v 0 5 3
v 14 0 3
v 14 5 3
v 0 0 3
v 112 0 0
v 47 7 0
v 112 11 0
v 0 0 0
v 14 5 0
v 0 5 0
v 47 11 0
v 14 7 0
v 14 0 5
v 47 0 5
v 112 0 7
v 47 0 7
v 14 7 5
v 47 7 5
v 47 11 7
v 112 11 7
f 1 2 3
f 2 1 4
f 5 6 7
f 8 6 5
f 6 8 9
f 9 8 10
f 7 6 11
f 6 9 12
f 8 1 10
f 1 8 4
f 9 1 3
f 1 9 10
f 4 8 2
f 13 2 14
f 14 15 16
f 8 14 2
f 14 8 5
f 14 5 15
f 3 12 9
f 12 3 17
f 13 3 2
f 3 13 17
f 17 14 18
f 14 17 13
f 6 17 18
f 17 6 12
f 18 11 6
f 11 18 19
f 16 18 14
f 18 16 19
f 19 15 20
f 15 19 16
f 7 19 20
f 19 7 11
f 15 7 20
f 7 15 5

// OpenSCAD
translate([1.0, 2.5, 1.5]) color([0.42636667866841493, 0.7546182662703457, 0.2896641383723638]) cube([2, 5, 3], center=true);
translate([3.0, 2.5, 1.5]) color([0.9011387199060191, 0.4178406508691356, 0.9725485107467589]) cube([2, 5, 3], center=true);
translate([5.0, 2.5, 1.5]) color([0.8454919814395919, 0.9722338049752182, 0.6074299110948179]) cube([2, 5, 3], center=true);
translate([7.0, 2.5, 1.5]) color([0.23357109614697547, 0.8647767439340015, 0.020481785066310598]) cube([2, 5, 3], center=true);
translate([9.0, 2.5, 1.5]) color([0.8852550461906246, 0.7407454042283365, 0.30244204779608386]) cube([2, 5, 3], center=true);
translate([11.0, 2.5, 1.5]) color([0.5702666361217156, 0.3326858137966755, 0.49351002171548763]) cube([2, 5, 3], center=true);
translate([13.0, 2.5, 1.5]) color([0.2620075340788589, 0.8250203378707534, 0.7724801555877414]) cube([2, 5, 3], center=true);
translate([15.5, 3.5, 2.5]) color([0.3841597274693662, 0.3836794276703801, 0.16379542381305134]) cube([3, 7, 5], center=true);
translate([18.5, 3.5, 2.5]) color([0.9355243379423083, 0.23895170008456956, 0.7294506641472926]) cube([3, 7, 5], center=true);
translate([21.5, 3.5, 2.5]) color([0.334024645801835, 0.9418620991403894, 0.4813304127593788]) cube([3, 7, 5], center=true);
translate([24.5, 3.5, 2.5]) color([0.14090487727396894, 0.8899614875266342, 0.6019667067914363]) cube([3, 7, 5], center=true);
translate([27.5, 3.5, 2.5]) color([0.08161964024263468, 0.6986964058233333, 0.8102884962164306]) cube([3, 7, 5], center=true);
translate([30.5, 3.5, 2.5]) color([0.3527718366022422, 0.03517979094215373, 0.4662789582213983]) cube([3, 7, 5], center=true);
translate([33.5, 3.5, 2.5]) color([0.458882332198567, 0.10148050986892876, 0.7781483542276006]) cube([3, 7, 5], center=true);
translate([36.5, 3.5, 2.5]) color([0.02022807324279441, 0.5983002604350479, 0.13270195297871745]) cube([3, 7, 5], center=true);
translate([39.5, 3.5, 2.5]) color([0.3239113547302247, 0.7000796910311562, 0.6489922579129634]) cube([3, 7, 5], center=true);
translate([42.5, 3.5, 2.5]) color([0.19497362064878687, 0.7834169698984913, 0.7774609885388588]) cube([3, 7, 5], center=true);
translate([45.5, 3.5, 2.5]) color([0.11099692345616674, 0.060160827712116616, 0.7008174245595068]) cube([3, 7, 5], center=true);
translate([49.5, 5.5, 3.5]) color([0.6143308403515266, 0.9339155207415325, 0.6504721799814983]) cube([5, 11, 7], center=true);
translate([54.5, 5.5, 3.5]) color([0.9694854220936419, 0.7136168898793864, 0.2963863893491513]) cube([5, 11, 7], center=true);
translate([59.5, 5.5, 3.5]) color([0.8491315553121948, 0.95846907728749, 0.38764569013819994]) cube([5, 11, 7], center=true);
translate([64.5, 5.5, 3.5]) color([0.29380353478258403, 0.7457841029207014, 0.9575468650535228]) cube([5, 11, 7], center=true);
translate([69.5, 5.5, 3.5]) color([0.98339807845839, 0.12155240415787172, 0.8604321836344089]) cube([5, 11, 7], center=true);
translate([74.5, 5.5, 3.5]) color([0.9958411320233901, 0.03818441020037311, 0.39202639046743215]) cube([5, 11, 7], center=true);
translate([79.5, 5.5, 3.5]) color([0.3715816420064585, 0.19047756087385292, 0.3565538137373233]) cube([5, 11, 7], center=true);
translate([84.5, 5.5, 3.5]) color([0.6320134108911423, 0.9564975354421206, 0.901927522825372]) cube([5, 11, 7], center=true);
translate([89.5, 5.5, 3.5]) color([0.039980675922074105, 0.2553863294502452, 0.02665600139486224]) cube([5, 11, 7], center=true);
translate([94.5, 5.5, 3.5]) color([0.5200631817170318, 0.5692567569896342, 0.8758772851227178]) cube([5, 11, 7], center=true);
translate([99.5, 5.5, 3.5]) color([0.2296552367022351, 0.7763426439418957, 0.8846860519705121]) cube([5, 11, 7], center=true);
translate([104.5, 5.5, 3.5]) color([0.6274277551427163, 0.5024128608294012, 0.5237115354844265]) cube([5, 11, 7], center=true);
translate([109.5, 5.5, 3.5]) color([0.5071067236759631, 0.9454855480301745, 0.14569042195357562]) cube([5, 11, 7], center=true);
